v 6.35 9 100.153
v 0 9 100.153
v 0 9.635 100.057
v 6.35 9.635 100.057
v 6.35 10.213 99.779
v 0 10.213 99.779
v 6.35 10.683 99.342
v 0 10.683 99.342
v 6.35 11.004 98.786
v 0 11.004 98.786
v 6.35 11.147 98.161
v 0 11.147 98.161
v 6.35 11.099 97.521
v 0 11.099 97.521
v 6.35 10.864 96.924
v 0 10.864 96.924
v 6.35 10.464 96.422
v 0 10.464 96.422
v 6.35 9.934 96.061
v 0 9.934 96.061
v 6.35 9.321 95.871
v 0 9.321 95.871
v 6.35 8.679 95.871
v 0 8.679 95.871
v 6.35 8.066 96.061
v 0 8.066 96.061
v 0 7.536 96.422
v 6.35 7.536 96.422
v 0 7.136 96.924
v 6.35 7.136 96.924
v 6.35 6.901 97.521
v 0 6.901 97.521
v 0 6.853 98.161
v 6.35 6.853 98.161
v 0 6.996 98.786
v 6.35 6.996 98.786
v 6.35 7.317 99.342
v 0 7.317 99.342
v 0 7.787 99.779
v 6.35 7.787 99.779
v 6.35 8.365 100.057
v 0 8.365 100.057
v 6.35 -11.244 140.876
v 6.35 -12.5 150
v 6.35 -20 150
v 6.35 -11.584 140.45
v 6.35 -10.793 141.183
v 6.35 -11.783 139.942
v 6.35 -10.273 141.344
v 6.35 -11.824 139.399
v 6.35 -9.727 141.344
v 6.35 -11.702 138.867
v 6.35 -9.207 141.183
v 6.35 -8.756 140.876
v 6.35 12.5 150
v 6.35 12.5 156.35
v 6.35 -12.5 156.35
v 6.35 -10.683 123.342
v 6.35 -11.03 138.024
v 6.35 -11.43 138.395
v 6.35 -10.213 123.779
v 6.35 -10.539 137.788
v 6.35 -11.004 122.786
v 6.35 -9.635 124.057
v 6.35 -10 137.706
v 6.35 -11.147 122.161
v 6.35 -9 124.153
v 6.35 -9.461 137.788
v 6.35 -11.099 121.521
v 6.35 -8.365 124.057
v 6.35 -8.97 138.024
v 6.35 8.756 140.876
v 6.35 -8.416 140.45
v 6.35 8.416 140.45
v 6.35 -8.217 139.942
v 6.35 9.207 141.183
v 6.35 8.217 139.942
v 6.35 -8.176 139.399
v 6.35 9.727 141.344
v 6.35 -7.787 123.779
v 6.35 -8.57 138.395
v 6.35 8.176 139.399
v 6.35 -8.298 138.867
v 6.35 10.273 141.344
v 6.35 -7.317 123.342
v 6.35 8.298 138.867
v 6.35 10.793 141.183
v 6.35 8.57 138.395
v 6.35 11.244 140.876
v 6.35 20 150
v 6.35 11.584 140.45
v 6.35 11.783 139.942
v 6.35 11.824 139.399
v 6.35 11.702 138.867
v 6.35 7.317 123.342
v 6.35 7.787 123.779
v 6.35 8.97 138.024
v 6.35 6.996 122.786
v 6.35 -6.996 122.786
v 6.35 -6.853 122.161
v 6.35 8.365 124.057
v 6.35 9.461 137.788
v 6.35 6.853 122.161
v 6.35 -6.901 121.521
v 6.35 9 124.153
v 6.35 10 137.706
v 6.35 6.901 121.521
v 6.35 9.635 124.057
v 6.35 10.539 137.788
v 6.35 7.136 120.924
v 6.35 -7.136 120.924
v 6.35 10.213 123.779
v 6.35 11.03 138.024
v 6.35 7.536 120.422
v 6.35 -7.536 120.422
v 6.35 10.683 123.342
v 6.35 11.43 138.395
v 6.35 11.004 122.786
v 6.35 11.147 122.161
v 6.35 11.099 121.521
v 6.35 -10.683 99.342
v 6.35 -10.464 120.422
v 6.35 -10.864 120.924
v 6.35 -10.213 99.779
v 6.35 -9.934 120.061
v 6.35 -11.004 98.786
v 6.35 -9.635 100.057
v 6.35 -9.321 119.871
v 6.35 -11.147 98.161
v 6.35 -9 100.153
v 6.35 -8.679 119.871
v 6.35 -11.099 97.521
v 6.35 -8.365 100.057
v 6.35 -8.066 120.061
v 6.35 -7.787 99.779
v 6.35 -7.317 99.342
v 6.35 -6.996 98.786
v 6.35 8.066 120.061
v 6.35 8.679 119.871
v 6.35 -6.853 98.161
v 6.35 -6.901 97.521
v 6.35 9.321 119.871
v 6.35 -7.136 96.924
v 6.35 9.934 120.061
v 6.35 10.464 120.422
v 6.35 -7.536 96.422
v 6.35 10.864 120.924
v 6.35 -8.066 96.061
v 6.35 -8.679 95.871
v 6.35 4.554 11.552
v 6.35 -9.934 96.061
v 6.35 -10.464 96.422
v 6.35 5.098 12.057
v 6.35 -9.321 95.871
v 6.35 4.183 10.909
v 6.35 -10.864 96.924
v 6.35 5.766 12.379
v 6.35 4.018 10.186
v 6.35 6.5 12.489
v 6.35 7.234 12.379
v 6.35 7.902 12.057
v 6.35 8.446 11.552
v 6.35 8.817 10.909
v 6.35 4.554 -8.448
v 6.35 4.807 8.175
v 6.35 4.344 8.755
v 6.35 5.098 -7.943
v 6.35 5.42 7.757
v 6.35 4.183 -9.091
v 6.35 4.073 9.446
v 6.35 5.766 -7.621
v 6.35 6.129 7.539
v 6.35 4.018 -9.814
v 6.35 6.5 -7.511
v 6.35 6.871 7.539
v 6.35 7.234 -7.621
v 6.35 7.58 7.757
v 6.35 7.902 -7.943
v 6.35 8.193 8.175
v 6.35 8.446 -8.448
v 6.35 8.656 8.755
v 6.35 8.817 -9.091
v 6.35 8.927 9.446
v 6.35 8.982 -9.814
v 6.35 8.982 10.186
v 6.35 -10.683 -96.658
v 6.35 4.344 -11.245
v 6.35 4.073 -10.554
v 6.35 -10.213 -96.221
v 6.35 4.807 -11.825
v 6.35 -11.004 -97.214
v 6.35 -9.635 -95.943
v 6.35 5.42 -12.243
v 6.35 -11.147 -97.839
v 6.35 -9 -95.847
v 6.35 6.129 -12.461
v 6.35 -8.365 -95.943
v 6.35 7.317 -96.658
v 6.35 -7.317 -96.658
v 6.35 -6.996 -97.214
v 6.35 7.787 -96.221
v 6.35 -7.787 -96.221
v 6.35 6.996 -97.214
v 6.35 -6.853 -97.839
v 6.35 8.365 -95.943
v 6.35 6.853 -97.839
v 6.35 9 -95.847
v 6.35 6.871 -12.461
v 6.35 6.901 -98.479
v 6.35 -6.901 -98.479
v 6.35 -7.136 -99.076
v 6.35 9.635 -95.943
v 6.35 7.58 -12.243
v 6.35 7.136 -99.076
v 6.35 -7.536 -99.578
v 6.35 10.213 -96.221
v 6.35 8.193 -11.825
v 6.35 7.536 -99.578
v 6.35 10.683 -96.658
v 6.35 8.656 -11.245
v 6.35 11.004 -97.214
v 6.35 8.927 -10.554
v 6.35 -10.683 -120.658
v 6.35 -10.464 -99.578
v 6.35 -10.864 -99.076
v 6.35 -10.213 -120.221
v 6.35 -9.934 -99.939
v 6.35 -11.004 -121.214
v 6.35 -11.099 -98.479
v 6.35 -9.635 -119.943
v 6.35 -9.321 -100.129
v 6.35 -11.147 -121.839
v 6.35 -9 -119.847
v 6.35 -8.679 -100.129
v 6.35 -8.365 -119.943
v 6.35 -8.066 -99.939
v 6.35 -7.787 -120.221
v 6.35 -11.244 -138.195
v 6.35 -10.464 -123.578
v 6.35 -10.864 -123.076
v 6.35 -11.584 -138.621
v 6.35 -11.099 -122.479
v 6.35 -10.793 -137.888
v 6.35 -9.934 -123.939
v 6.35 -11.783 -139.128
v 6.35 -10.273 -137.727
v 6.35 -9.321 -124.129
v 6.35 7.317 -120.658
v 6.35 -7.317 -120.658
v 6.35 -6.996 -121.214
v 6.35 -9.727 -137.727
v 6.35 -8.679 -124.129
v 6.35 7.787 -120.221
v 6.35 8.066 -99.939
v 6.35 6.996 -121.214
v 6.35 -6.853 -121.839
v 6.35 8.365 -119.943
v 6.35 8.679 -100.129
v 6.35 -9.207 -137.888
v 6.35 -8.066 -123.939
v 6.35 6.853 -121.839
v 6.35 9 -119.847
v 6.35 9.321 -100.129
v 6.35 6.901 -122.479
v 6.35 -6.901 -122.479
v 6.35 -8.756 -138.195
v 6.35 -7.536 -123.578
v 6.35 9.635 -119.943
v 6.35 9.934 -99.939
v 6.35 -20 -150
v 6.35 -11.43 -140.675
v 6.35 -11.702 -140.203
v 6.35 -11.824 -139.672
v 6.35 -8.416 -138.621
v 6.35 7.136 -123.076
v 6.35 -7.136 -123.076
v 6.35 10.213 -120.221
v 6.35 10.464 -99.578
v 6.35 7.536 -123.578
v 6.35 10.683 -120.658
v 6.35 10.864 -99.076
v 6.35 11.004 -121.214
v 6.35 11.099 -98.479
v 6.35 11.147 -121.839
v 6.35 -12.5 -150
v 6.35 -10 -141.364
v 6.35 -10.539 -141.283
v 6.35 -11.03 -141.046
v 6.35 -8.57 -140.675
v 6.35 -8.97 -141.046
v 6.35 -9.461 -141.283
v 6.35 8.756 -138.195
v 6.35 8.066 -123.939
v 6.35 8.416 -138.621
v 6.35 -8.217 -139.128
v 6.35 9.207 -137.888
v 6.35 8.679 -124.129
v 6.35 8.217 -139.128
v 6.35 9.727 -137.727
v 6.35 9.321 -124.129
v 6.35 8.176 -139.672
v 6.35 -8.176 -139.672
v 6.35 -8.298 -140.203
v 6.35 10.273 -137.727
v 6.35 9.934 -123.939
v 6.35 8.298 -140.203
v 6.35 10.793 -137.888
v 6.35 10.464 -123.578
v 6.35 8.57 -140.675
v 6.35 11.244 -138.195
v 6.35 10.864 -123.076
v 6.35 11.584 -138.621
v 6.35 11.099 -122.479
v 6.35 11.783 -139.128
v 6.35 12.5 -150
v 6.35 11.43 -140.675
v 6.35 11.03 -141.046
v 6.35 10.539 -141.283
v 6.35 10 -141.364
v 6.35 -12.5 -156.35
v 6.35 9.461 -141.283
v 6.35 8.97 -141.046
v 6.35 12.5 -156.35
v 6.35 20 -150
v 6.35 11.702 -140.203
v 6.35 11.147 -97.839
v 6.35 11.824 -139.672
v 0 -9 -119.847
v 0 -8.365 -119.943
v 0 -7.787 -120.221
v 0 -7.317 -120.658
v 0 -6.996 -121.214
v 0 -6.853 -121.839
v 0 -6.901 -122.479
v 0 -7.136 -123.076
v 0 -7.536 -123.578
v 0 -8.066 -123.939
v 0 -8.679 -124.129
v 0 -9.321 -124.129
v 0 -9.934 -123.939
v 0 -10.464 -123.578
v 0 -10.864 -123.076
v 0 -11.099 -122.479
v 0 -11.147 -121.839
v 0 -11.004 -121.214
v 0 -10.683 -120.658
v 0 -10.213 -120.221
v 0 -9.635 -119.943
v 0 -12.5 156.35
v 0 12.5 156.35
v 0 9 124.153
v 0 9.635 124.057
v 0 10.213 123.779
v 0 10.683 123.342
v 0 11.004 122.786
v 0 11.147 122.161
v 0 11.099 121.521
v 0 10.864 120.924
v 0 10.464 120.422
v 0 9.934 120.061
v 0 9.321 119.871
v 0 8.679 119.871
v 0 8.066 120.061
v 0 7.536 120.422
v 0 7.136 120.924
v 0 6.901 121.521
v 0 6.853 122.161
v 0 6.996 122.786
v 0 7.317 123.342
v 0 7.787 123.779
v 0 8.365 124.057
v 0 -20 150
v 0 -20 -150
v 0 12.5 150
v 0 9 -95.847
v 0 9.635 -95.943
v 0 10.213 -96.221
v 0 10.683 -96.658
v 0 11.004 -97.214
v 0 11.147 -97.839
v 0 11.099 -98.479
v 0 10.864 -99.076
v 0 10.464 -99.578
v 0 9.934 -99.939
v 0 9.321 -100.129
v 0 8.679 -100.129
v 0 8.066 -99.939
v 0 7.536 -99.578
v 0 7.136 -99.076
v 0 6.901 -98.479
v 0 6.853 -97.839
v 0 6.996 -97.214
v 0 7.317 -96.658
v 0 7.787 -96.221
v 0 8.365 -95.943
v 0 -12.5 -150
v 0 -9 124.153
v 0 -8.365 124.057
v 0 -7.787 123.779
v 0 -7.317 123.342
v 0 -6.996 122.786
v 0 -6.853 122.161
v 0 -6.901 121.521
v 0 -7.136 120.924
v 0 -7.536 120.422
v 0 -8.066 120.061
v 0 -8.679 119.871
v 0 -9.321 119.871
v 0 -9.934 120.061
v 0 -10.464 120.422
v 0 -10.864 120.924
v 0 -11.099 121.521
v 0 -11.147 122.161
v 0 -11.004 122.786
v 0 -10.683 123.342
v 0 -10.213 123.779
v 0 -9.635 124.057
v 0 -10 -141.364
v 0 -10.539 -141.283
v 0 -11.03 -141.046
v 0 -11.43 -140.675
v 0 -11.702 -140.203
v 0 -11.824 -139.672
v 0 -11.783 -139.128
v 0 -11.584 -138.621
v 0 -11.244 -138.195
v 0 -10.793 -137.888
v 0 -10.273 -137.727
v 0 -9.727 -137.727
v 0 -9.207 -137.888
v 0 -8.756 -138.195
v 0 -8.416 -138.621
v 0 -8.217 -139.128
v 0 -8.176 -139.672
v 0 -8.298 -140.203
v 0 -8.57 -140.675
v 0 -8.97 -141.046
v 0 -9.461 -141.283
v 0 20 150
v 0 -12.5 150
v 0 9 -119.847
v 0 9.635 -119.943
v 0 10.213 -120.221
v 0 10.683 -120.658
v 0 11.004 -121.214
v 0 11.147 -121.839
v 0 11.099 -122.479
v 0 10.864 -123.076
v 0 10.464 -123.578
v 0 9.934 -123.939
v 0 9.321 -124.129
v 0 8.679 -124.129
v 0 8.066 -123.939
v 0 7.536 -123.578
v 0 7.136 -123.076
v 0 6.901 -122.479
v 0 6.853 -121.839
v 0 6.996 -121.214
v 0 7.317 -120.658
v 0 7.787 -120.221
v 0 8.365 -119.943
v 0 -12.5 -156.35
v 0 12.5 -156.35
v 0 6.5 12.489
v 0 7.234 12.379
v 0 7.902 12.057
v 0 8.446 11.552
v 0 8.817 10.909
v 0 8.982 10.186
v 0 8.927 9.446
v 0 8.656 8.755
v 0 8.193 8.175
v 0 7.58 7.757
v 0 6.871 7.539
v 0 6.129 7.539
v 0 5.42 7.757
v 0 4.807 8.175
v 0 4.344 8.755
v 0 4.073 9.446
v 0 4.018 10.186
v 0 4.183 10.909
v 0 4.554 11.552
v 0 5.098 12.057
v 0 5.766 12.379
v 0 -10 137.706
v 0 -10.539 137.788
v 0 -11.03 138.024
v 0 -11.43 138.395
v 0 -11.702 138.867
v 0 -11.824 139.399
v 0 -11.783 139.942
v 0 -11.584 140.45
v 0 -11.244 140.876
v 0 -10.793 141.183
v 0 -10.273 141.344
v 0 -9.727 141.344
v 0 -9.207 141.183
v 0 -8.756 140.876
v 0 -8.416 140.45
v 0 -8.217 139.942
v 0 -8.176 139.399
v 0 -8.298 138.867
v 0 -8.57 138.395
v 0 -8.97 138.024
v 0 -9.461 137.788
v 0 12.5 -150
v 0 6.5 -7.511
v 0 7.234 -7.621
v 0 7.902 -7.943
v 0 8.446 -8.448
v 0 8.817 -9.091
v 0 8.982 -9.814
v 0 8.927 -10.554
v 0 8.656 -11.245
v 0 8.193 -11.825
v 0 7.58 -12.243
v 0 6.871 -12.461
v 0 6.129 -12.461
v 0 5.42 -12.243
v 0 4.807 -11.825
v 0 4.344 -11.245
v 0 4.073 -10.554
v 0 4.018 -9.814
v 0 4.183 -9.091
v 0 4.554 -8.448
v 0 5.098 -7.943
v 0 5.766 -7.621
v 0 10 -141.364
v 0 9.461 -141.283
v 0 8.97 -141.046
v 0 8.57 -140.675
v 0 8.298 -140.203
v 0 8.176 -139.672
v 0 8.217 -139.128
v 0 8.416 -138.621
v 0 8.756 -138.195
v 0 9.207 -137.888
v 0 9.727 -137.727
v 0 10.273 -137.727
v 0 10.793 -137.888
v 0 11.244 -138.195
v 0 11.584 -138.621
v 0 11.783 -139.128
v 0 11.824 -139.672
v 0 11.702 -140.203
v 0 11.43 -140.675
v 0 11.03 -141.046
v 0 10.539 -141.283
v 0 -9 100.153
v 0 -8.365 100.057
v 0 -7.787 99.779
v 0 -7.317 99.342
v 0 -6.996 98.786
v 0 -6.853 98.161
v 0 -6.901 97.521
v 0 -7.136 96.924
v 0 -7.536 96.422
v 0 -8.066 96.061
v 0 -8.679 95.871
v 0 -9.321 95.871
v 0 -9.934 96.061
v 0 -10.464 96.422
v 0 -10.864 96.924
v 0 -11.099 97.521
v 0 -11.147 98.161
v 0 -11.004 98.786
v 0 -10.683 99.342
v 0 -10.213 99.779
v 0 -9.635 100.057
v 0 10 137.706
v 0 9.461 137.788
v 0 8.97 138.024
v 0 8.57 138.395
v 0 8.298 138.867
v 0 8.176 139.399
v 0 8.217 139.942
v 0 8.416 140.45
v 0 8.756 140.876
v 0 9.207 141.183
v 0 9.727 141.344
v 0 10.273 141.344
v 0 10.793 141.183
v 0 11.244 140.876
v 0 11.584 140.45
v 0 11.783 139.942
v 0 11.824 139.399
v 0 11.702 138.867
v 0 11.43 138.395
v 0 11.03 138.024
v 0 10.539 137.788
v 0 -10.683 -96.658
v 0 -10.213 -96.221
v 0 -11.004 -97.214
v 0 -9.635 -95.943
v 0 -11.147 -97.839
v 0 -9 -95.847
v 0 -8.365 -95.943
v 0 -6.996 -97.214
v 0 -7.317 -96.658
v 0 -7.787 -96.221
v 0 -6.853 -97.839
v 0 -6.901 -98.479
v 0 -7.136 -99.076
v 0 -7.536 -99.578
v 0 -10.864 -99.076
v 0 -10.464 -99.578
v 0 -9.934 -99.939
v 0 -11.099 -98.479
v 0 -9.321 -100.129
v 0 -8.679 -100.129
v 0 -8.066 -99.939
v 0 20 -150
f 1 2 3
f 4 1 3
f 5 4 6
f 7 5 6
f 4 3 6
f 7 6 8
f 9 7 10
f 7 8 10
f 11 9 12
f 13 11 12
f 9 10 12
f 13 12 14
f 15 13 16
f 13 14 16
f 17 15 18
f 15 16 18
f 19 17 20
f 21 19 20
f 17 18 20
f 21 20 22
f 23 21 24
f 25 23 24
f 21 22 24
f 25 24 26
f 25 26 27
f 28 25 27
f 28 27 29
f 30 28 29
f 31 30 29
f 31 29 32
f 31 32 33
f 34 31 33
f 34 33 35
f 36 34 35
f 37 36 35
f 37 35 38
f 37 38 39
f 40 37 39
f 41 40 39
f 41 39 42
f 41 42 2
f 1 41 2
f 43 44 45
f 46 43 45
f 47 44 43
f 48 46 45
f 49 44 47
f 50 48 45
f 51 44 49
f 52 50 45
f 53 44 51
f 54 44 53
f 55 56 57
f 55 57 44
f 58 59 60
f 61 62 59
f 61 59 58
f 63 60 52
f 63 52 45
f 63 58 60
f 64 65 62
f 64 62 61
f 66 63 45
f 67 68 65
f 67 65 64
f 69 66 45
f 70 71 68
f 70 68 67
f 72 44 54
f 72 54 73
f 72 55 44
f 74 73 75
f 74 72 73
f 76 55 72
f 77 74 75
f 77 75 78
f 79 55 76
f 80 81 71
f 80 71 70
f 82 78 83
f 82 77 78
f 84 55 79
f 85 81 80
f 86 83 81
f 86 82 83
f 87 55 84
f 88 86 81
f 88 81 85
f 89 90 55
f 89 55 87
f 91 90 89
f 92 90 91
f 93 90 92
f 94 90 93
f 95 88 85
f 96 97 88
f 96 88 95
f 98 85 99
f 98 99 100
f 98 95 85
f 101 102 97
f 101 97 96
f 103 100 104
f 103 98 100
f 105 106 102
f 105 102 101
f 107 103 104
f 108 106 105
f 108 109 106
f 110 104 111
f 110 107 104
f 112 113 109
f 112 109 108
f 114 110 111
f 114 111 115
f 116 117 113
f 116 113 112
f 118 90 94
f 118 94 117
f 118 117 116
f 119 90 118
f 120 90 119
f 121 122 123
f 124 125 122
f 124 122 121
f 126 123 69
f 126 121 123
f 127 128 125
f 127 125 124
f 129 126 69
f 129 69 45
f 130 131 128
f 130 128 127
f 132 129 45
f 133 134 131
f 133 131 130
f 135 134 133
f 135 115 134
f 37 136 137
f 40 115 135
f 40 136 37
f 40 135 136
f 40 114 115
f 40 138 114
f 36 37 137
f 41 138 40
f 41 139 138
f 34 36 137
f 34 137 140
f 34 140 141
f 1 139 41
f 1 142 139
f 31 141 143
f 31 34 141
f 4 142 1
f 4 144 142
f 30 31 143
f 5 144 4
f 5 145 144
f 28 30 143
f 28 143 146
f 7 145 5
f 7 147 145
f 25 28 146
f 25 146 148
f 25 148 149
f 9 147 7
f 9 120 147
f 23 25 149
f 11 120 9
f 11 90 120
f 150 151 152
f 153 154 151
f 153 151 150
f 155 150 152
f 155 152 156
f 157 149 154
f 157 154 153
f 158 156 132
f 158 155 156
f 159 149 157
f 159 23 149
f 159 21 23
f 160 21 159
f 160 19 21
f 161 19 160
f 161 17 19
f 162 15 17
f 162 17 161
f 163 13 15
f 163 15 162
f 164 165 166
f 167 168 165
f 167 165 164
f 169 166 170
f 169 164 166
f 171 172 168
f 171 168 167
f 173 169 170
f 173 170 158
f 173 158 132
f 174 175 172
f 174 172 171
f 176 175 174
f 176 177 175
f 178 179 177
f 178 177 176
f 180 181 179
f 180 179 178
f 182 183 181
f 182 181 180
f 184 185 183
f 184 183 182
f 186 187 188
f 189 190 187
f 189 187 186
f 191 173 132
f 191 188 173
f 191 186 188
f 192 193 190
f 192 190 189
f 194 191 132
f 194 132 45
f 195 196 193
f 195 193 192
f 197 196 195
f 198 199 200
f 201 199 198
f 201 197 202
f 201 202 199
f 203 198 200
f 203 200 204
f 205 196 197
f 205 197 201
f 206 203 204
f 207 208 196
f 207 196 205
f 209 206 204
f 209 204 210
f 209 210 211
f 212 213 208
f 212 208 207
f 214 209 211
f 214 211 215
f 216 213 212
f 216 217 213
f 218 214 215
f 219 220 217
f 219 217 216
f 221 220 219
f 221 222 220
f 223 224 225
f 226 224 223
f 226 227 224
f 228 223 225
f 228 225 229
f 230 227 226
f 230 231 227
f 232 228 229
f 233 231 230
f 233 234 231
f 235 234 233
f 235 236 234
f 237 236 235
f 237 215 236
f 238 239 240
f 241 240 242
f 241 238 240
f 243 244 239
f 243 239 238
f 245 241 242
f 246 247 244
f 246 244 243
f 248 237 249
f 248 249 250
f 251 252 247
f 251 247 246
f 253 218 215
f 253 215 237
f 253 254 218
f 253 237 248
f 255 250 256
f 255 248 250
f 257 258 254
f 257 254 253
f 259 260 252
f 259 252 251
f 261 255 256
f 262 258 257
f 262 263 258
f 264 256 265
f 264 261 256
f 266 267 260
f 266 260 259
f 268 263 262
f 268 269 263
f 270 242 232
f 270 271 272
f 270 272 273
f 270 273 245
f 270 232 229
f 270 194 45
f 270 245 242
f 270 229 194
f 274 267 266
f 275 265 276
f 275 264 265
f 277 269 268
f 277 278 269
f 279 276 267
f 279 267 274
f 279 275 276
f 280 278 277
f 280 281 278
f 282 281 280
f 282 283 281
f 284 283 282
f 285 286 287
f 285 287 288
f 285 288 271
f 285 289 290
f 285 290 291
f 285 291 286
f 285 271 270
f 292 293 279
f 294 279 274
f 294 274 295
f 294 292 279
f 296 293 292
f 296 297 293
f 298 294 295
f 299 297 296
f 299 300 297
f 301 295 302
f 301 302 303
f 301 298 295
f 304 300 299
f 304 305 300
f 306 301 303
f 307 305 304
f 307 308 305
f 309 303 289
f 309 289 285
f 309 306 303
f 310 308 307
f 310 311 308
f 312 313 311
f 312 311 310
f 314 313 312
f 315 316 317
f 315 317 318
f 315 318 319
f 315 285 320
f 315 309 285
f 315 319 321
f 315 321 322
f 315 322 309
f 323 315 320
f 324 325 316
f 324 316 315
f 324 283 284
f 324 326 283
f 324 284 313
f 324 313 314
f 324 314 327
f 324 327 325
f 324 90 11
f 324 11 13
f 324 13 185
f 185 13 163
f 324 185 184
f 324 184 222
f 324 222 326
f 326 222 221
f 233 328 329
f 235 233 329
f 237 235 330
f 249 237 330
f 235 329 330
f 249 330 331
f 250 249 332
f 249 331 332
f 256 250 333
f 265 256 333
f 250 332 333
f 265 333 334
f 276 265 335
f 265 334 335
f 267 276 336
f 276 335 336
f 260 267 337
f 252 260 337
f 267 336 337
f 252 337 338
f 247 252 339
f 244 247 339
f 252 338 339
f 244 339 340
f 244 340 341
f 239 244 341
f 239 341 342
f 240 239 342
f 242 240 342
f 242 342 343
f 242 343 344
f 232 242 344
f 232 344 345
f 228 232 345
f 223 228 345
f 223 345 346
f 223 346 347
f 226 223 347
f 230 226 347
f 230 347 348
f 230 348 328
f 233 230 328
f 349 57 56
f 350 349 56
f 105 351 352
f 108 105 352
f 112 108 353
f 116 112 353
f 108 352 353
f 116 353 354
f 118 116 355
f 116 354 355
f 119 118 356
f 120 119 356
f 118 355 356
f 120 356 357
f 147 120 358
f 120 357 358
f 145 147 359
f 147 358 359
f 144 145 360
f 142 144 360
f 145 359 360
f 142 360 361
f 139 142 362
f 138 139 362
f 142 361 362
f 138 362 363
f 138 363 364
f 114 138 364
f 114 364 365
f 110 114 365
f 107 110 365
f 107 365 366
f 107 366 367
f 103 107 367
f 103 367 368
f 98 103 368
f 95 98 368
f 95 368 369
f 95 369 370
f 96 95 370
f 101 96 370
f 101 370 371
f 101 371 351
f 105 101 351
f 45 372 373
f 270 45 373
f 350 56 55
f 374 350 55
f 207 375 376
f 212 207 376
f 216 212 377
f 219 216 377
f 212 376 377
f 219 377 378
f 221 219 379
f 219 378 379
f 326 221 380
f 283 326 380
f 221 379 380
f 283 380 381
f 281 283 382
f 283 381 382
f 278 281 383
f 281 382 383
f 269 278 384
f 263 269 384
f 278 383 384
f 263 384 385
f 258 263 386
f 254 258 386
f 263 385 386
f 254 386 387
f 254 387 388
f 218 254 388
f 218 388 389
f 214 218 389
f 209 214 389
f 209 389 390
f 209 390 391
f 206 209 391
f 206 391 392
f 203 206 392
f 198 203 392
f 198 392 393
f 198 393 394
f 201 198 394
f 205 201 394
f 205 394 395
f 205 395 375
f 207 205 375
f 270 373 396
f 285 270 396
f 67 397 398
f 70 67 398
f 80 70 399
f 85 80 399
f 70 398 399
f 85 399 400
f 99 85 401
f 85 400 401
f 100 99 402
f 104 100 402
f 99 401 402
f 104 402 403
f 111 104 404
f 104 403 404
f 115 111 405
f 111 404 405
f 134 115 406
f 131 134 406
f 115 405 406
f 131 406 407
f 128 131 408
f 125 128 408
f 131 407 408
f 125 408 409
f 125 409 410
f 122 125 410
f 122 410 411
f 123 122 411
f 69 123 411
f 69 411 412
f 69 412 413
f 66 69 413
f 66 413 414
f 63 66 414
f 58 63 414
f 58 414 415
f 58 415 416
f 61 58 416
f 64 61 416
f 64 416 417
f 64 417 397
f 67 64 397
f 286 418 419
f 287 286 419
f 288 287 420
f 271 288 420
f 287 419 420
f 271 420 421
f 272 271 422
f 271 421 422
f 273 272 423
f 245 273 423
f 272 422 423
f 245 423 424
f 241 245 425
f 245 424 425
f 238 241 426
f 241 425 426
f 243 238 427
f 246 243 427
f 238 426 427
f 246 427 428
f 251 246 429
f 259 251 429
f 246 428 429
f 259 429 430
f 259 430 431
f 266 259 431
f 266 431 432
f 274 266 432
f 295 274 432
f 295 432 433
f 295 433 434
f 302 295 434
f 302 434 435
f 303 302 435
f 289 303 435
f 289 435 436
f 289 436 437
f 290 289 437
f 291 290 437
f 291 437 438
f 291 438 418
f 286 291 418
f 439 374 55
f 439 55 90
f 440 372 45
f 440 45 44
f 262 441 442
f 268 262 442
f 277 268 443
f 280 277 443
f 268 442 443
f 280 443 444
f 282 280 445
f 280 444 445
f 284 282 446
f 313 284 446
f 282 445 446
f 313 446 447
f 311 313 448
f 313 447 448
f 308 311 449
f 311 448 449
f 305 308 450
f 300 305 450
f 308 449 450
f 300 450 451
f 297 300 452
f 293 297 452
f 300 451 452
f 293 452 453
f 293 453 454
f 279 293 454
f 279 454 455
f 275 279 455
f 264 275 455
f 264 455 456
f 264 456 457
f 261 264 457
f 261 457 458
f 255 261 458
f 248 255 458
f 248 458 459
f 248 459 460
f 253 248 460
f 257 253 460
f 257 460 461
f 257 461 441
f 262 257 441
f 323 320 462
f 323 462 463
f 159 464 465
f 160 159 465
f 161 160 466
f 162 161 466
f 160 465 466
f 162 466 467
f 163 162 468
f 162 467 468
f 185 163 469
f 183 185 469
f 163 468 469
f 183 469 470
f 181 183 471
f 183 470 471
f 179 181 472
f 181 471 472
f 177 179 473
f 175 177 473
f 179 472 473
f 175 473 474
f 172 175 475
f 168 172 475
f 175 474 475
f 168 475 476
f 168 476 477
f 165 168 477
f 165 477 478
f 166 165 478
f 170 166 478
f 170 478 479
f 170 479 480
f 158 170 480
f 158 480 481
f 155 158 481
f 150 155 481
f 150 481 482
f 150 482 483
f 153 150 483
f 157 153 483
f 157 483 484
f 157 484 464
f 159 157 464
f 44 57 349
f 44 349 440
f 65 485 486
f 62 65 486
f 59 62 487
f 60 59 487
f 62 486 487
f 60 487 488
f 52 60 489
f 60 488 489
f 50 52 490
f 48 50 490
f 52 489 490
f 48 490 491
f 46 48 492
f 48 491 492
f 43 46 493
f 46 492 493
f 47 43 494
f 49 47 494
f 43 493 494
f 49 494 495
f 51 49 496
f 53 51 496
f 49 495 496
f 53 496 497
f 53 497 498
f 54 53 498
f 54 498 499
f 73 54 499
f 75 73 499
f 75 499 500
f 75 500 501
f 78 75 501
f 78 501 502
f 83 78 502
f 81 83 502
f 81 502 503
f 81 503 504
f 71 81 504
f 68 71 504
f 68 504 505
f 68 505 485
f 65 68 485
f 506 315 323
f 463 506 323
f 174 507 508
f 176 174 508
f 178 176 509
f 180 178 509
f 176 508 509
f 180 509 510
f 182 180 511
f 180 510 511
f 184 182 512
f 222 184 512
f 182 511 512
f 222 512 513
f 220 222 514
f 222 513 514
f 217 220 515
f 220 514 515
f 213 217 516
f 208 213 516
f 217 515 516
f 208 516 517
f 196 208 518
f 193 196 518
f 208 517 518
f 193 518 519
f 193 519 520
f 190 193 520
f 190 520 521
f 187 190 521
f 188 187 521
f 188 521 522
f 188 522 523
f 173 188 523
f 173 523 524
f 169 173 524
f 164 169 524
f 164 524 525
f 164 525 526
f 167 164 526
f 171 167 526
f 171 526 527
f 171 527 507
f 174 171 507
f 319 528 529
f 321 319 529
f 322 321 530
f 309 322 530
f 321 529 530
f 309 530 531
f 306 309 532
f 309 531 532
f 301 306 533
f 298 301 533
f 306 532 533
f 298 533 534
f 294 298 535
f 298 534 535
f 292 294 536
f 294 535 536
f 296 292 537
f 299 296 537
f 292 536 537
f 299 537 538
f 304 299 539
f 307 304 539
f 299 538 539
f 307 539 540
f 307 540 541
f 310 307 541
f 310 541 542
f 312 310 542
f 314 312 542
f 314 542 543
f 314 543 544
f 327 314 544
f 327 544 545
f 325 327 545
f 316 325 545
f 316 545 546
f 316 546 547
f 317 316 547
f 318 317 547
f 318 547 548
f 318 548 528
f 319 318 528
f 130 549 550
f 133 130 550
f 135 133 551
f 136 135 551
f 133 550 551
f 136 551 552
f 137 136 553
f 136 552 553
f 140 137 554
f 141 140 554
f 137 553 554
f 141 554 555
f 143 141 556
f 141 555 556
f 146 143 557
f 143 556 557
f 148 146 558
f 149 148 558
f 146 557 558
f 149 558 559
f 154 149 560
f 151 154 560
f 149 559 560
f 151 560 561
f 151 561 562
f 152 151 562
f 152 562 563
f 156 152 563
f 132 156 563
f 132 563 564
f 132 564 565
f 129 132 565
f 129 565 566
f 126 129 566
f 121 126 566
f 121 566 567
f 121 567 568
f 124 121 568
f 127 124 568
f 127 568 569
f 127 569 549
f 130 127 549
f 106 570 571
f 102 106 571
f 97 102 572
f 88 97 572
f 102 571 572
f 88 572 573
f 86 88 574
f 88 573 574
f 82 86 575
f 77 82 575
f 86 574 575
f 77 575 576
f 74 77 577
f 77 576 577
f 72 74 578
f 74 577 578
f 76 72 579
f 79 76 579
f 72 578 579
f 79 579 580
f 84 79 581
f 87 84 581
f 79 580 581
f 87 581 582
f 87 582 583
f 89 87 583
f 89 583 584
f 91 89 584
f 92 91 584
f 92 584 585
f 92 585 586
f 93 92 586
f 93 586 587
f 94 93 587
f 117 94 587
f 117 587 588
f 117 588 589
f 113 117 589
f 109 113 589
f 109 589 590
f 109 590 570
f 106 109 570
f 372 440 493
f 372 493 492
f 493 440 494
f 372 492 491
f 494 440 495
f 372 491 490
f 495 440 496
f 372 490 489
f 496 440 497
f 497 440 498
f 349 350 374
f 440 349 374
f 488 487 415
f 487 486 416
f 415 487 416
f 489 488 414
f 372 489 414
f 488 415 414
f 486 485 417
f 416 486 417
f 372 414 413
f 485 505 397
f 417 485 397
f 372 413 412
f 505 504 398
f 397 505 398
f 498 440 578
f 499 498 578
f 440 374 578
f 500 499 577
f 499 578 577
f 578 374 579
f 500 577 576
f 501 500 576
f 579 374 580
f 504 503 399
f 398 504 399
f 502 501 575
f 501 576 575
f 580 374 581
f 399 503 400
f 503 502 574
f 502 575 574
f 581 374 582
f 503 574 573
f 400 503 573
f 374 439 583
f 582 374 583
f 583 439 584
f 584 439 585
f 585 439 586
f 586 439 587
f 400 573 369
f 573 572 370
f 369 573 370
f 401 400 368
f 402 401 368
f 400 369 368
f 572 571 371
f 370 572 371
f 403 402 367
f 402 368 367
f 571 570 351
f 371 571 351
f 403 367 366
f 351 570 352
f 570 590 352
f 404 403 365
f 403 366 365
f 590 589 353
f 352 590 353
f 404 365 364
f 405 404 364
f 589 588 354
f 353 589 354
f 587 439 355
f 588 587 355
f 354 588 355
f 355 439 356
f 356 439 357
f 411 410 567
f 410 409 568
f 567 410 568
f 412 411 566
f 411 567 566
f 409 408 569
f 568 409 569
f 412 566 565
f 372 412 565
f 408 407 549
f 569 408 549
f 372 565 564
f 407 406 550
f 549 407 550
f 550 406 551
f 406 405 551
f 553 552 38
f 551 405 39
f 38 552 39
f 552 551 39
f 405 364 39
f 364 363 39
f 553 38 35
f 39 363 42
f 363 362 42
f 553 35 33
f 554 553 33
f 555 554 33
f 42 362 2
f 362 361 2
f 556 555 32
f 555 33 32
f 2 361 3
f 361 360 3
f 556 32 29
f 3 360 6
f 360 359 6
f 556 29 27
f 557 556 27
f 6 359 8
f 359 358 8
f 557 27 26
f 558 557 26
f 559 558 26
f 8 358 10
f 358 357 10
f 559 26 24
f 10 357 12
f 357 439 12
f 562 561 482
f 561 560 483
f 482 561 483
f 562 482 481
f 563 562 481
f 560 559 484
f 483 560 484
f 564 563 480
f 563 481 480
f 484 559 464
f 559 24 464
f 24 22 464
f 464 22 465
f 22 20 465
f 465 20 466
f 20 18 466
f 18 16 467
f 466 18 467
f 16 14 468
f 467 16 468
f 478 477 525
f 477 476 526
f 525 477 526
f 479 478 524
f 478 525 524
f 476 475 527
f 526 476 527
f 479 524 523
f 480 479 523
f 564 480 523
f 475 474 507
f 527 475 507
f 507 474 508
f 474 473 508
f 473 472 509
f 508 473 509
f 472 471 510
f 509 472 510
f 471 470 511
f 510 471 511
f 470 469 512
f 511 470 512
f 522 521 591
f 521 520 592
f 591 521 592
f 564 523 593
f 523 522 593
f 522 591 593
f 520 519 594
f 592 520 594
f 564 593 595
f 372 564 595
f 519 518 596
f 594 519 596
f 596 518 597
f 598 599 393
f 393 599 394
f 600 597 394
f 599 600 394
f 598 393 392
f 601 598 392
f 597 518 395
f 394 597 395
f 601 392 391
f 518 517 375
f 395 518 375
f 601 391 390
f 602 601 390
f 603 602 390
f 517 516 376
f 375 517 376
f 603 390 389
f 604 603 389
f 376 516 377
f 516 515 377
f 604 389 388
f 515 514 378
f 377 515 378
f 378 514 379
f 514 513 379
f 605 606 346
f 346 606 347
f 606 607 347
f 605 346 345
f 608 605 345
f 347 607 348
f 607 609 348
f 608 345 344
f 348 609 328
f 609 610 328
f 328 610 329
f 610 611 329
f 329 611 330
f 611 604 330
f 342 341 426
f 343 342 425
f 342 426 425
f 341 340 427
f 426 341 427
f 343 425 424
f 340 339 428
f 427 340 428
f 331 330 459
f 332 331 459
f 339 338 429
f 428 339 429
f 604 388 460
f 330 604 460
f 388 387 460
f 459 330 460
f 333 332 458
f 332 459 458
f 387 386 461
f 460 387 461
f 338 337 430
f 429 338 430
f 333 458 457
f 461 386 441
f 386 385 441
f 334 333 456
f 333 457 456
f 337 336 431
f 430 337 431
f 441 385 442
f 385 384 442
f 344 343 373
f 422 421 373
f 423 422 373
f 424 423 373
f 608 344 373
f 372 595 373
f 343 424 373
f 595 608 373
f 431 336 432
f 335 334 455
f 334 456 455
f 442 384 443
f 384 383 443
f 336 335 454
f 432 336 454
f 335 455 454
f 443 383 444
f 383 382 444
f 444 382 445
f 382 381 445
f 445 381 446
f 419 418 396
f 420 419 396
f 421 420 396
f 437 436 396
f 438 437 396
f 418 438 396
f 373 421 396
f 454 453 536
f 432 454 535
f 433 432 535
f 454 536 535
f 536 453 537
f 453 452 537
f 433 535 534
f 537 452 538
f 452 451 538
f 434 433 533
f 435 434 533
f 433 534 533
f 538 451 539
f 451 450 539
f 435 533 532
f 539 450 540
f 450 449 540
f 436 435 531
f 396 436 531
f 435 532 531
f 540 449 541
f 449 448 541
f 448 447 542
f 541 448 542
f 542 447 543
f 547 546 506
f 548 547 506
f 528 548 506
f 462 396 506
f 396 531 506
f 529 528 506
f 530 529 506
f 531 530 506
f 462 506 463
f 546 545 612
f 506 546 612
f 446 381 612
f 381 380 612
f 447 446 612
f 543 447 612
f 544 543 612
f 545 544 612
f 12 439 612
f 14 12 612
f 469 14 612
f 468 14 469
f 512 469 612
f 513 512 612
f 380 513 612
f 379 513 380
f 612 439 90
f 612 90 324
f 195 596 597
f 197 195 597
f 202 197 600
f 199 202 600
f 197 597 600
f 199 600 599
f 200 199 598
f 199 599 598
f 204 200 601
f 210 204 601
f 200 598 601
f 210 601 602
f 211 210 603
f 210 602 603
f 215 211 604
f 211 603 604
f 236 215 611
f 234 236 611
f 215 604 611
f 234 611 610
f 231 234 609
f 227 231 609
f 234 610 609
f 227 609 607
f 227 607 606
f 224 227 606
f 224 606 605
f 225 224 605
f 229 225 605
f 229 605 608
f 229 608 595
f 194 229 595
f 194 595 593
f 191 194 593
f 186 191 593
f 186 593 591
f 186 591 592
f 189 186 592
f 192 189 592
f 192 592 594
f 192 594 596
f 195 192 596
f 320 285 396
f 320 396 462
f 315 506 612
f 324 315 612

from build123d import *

# Parameters (mm, degrees)
SKETCH1_W              = 300
SKETCH1_H              = 40
BOSS_EXTRUDE1_DEPTH    = 6.35
SKETCH2_W              = 6.35
SKETCH2_H              = 25
BOSS_EXTRUDE2_DEPTH    = 6.35
F_10_CLEARANCE_HOLE1_D = 4.9784
F_8_CLEARANCE_HOLE1_D  = 4.3053
F_6_CLEARANCE_HOLE1_D  = 3.6576


with BuildPart() as part:
    # Sketch1 → Boss-Extrude1 (new body)
    with BuildSketch(Plane(origin=(0, 0, 0), x_dir=(0, 0, -1), z_dir=(1, 0, 0))):
        Rectangle(SKETCH1_W, SKETCH1_H)
    extrude(amount=BOSS_EXTRUDE1_DEPTH)

    # Sketch2 → Boss-Extrude2 (add)
    with BuildSketch(Plane(origin=(6.35, 0, 0), x_dir=(0, 0, -1), z_dir=(1, 0, 0))):
        with Locations((-153.175, 0)):
            Rectangle(SKETCH2_W, SKETCH2_H)
        with Locations((153.175, 0)):
            Rectangle(SKETCH2_W, SKETCH2_H)
    extrude(amount=-BOSS_EXTRUDE2_DEPTH)

    # #10 Clearance Hole1 (through all)
    with Locations(Plane(origin=(6.35, 0, 0), x_dir=(0, 0, -1), z_dir=(1, 0, 0))):
        with Locations((-10, 6.5), (10, 6.5)):
            Hole(F_10_CLEARANCE_HOLE1_D / 2)

    # #8 Clearance Hole1 (through all)
    with Locations(Plane(origin=(6.35, 0, 0), x_dir=(0, 0, -1), z_dir=(1, 0, 0))):
        with Locations((-122, 9), (-98, 9), (-98, -9), (-122, -9), (98, 9), (122, 9), (122, -9), (98, -9)):
            Hole(F_8_CLEARANCE_HOLE1_D / 2)

    # #6 Clearance Hole1 (through all)
    with Locations(Plane(origin=(6.35, 10, 139.5352), x_dir=(0, 0, 1), z_dir=(1, 0, 0))):
        with Locations((0, 0), (0, 20), (-279.0704, 0), (-279.0704, 20)):
            Hole(F_6_CLEARANCE_HOLE1_D / 2)


solid = part.part
